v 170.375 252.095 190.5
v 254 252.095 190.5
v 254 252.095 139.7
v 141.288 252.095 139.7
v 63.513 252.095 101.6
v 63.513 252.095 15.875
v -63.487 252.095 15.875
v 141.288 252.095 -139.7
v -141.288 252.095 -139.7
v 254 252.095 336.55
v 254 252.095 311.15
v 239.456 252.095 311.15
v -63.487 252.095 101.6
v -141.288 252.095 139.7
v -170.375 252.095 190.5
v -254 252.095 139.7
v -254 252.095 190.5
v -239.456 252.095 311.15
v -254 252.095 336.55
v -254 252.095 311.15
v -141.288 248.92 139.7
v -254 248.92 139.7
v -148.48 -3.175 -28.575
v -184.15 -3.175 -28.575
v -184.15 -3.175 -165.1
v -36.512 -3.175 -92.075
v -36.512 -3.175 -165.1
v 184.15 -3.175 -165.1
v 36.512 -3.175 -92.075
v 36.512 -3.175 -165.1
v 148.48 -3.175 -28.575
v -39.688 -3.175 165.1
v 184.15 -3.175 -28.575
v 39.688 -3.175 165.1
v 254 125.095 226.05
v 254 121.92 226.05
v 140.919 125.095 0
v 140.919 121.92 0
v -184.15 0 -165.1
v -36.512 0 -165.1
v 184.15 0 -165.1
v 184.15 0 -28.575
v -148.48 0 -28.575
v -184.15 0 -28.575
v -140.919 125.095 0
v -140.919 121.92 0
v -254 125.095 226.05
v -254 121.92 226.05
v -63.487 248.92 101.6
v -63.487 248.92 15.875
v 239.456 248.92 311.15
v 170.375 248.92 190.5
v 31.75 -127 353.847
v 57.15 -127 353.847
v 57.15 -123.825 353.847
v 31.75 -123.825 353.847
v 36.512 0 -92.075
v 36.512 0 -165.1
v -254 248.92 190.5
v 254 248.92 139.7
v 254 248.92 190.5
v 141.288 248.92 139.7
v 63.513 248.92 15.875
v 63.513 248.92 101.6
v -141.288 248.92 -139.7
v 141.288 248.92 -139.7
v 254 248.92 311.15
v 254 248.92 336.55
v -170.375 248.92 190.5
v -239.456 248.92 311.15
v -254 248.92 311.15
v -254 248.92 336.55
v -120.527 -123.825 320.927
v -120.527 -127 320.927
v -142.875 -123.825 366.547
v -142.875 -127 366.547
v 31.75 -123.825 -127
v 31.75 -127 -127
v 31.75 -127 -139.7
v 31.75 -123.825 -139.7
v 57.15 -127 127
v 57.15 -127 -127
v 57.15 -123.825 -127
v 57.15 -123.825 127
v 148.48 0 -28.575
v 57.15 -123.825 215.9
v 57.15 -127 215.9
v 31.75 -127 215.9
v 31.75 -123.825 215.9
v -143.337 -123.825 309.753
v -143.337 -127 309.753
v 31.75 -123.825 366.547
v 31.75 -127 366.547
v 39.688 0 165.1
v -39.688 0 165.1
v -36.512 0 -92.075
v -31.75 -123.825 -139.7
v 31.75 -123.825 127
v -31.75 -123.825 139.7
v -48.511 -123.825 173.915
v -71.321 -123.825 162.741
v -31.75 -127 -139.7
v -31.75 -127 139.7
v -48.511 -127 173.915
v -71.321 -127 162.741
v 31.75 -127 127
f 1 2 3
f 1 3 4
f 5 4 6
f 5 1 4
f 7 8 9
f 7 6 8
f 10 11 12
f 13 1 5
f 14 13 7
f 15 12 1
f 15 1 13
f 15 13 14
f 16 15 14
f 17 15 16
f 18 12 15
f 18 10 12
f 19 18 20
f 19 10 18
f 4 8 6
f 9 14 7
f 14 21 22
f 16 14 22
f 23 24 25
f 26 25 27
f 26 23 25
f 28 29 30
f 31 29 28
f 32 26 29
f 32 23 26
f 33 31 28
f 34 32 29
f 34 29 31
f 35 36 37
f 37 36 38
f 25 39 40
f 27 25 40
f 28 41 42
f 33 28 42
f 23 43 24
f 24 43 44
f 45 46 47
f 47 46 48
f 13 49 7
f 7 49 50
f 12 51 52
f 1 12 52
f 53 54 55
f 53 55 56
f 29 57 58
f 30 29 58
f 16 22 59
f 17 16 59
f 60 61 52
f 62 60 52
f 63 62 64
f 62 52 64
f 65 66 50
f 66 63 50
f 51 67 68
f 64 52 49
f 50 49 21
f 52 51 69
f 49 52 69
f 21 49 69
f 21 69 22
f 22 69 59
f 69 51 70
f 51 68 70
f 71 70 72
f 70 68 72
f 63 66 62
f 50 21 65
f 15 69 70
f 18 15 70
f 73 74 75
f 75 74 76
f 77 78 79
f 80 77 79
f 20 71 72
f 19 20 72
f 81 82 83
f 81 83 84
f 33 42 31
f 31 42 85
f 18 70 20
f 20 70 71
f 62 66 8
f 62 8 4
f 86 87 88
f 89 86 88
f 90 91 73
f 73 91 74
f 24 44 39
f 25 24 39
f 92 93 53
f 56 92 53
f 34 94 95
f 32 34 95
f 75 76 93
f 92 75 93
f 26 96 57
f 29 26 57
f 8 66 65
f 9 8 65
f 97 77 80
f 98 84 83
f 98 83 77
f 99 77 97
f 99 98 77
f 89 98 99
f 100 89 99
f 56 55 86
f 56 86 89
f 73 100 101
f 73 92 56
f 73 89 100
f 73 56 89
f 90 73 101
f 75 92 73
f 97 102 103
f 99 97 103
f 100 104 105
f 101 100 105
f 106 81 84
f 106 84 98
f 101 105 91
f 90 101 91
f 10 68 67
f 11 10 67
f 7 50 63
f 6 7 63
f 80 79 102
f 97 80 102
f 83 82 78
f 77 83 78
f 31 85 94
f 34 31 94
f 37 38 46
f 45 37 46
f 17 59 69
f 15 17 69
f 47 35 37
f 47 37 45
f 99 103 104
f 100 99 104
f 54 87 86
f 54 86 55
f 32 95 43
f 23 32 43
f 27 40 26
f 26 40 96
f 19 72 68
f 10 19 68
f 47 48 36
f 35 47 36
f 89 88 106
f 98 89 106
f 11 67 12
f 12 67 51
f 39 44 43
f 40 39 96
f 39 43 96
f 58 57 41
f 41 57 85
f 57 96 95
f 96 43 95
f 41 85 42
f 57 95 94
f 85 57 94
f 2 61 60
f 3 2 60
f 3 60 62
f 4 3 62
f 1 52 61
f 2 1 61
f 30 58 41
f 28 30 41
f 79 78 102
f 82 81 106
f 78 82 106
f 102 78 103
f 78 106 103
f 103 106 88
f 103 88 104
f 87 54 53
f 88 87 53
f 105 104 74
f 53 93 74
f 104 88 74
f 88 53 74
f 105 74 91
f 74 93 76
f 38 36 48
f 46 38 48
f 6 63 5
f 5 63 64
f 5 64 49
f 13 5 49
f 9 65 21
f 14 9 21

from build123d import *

# Parameters (mm, degrees)
F1_DEPTH  = 3.175
F3_W      = 25.4
F3_H      = 254
F3_H_2    = 137.9474
F4_DEPTH  = 3.175
F7_DEPTH  = 3.175
F9_W      = 282.575
F9_H      = 279.4
F10_DEPTH = 3.175


# Not quite as in the source:
# - a length typed as a fraction of an inch, garbled in the dataset ("3 / 203.2 mm" for 3/8 in), is restored


with BuildPart() as f1:
    # F0 (on Front) → F1 (new body)
    with BuildSketch(Plane.XZ):
        Polygon((36.5125, 165.1), (-36.5125, 165.1), (-39.6875, 165.1), (-148.4802469136, -28.575), (-184.15, -28.575), (-184.15, -92.075), (-184.15, -165.1), (-36.5125, -165.1), (-36.5125, -92.075), (36.5125, -92.075), (36.5125, -165.1), (184.15, -165.1), (184.15, -92.075), (184.15, -28.575), (148.4802469136, -28.575), (39.6875, 165.1), align=None)
    extrude(amount=F1_DEPTH)


with BuildPart() as f4:
    # F3 (on offset) → F4 (new body)
    with BuildSketch(Plane(origin=(0, -127, 0), x_dir=(-1, 0, 0), z_dir=(0, 1, 0))):
        Polygon((31.75, -139.7), (31.75, 139.7), (-31.75, 139.7), (-31.75, 127), (-31.75, -127), (-31.75, -139.7), align=None)
        Polygon((-31.75, 139.7), (31.75, 139.7), (48.5109045543, 173.9152316742), (120.5271272609, 320.927091101), (142.875, 366.5474), (-31.75, 366.5474), (-31.75, 353.8474), (-31.75, 215.9), align=None)
        Polygon((120.5271272609, 320.927091101), (48.5109045543, 173.9152316742), (71.3210590038, 162.7412953047), (143.3372817104, 309.7531547315), align=None)
        with Locations((-44.45, 0)):
            Rectangle(F3_W, F3_H)
        with Locations((-44.45, 284.8737)):
            Rectangle(F3_W, F3_H_2)
    extrude(amount=F4_DEPTH)


with BuildPart() as f7:
    # F6 (on offset) → F7 (new body)
    with BuildSketch(Plane(origin=(0, 121.92, 0), x_dir=(-1, 0, 0), z_dir=(0, 1, 0))):
        Polygon((254, 226.0501956), (0, 226.0501956), (-254, 226.0501956), (-140.9192, 0), (0, 0), (140.9192, 0), align=None)
    extrude(amount=F7_DEPTH)


with BuildPart() as f10:
    # F9 (on offset) → F10 (new body)
    with BuildSketch(Plane(origin=(0, 248.92, 0), x_dir=(-1, 0, 0), z_dir=(0, 1, 0))):
        Rectangle(F9_W, F9_H)
        Polygon((-0.0127, 15.875), (-63.5127, 15.875), (-63.5127, 101.6), (-0.0127, 101.6), (63.4873, 101.6), (63.4873, 15.875), align=None, mode=Mode.SUBTRACT)
        Polygon((-170.3745967742, 190.5), (-141.2875, 139.7), (141.2875, 139.7), (170.3745967742, 190.5), (239.4564516129, 311.15), (254, 336.55), (-254, 336.55), (-239.4564516129, 311.15), align=None)
        Polygon((-254, 139.7), (-141.2875, 139.7), (-170.3745967742, 190.5), (-254, 190.5), align=None)
        Polygon((170.3745967742, 190.5), (141.2875, 139.7), (254, 139.7), (254, 190.5), align=None)
        Polygon((254, 336.55), (239.4564516129, 311.15), (254, 311.15), align=None)
        Polygon((-254, 311.15), (-239.4564516129, 311.15), (-254, 336.55), align=None)
    extrude(amount=F10_DEPTH)


solid = Compound([f1.part, f4.part, f7.part, f10.part])
